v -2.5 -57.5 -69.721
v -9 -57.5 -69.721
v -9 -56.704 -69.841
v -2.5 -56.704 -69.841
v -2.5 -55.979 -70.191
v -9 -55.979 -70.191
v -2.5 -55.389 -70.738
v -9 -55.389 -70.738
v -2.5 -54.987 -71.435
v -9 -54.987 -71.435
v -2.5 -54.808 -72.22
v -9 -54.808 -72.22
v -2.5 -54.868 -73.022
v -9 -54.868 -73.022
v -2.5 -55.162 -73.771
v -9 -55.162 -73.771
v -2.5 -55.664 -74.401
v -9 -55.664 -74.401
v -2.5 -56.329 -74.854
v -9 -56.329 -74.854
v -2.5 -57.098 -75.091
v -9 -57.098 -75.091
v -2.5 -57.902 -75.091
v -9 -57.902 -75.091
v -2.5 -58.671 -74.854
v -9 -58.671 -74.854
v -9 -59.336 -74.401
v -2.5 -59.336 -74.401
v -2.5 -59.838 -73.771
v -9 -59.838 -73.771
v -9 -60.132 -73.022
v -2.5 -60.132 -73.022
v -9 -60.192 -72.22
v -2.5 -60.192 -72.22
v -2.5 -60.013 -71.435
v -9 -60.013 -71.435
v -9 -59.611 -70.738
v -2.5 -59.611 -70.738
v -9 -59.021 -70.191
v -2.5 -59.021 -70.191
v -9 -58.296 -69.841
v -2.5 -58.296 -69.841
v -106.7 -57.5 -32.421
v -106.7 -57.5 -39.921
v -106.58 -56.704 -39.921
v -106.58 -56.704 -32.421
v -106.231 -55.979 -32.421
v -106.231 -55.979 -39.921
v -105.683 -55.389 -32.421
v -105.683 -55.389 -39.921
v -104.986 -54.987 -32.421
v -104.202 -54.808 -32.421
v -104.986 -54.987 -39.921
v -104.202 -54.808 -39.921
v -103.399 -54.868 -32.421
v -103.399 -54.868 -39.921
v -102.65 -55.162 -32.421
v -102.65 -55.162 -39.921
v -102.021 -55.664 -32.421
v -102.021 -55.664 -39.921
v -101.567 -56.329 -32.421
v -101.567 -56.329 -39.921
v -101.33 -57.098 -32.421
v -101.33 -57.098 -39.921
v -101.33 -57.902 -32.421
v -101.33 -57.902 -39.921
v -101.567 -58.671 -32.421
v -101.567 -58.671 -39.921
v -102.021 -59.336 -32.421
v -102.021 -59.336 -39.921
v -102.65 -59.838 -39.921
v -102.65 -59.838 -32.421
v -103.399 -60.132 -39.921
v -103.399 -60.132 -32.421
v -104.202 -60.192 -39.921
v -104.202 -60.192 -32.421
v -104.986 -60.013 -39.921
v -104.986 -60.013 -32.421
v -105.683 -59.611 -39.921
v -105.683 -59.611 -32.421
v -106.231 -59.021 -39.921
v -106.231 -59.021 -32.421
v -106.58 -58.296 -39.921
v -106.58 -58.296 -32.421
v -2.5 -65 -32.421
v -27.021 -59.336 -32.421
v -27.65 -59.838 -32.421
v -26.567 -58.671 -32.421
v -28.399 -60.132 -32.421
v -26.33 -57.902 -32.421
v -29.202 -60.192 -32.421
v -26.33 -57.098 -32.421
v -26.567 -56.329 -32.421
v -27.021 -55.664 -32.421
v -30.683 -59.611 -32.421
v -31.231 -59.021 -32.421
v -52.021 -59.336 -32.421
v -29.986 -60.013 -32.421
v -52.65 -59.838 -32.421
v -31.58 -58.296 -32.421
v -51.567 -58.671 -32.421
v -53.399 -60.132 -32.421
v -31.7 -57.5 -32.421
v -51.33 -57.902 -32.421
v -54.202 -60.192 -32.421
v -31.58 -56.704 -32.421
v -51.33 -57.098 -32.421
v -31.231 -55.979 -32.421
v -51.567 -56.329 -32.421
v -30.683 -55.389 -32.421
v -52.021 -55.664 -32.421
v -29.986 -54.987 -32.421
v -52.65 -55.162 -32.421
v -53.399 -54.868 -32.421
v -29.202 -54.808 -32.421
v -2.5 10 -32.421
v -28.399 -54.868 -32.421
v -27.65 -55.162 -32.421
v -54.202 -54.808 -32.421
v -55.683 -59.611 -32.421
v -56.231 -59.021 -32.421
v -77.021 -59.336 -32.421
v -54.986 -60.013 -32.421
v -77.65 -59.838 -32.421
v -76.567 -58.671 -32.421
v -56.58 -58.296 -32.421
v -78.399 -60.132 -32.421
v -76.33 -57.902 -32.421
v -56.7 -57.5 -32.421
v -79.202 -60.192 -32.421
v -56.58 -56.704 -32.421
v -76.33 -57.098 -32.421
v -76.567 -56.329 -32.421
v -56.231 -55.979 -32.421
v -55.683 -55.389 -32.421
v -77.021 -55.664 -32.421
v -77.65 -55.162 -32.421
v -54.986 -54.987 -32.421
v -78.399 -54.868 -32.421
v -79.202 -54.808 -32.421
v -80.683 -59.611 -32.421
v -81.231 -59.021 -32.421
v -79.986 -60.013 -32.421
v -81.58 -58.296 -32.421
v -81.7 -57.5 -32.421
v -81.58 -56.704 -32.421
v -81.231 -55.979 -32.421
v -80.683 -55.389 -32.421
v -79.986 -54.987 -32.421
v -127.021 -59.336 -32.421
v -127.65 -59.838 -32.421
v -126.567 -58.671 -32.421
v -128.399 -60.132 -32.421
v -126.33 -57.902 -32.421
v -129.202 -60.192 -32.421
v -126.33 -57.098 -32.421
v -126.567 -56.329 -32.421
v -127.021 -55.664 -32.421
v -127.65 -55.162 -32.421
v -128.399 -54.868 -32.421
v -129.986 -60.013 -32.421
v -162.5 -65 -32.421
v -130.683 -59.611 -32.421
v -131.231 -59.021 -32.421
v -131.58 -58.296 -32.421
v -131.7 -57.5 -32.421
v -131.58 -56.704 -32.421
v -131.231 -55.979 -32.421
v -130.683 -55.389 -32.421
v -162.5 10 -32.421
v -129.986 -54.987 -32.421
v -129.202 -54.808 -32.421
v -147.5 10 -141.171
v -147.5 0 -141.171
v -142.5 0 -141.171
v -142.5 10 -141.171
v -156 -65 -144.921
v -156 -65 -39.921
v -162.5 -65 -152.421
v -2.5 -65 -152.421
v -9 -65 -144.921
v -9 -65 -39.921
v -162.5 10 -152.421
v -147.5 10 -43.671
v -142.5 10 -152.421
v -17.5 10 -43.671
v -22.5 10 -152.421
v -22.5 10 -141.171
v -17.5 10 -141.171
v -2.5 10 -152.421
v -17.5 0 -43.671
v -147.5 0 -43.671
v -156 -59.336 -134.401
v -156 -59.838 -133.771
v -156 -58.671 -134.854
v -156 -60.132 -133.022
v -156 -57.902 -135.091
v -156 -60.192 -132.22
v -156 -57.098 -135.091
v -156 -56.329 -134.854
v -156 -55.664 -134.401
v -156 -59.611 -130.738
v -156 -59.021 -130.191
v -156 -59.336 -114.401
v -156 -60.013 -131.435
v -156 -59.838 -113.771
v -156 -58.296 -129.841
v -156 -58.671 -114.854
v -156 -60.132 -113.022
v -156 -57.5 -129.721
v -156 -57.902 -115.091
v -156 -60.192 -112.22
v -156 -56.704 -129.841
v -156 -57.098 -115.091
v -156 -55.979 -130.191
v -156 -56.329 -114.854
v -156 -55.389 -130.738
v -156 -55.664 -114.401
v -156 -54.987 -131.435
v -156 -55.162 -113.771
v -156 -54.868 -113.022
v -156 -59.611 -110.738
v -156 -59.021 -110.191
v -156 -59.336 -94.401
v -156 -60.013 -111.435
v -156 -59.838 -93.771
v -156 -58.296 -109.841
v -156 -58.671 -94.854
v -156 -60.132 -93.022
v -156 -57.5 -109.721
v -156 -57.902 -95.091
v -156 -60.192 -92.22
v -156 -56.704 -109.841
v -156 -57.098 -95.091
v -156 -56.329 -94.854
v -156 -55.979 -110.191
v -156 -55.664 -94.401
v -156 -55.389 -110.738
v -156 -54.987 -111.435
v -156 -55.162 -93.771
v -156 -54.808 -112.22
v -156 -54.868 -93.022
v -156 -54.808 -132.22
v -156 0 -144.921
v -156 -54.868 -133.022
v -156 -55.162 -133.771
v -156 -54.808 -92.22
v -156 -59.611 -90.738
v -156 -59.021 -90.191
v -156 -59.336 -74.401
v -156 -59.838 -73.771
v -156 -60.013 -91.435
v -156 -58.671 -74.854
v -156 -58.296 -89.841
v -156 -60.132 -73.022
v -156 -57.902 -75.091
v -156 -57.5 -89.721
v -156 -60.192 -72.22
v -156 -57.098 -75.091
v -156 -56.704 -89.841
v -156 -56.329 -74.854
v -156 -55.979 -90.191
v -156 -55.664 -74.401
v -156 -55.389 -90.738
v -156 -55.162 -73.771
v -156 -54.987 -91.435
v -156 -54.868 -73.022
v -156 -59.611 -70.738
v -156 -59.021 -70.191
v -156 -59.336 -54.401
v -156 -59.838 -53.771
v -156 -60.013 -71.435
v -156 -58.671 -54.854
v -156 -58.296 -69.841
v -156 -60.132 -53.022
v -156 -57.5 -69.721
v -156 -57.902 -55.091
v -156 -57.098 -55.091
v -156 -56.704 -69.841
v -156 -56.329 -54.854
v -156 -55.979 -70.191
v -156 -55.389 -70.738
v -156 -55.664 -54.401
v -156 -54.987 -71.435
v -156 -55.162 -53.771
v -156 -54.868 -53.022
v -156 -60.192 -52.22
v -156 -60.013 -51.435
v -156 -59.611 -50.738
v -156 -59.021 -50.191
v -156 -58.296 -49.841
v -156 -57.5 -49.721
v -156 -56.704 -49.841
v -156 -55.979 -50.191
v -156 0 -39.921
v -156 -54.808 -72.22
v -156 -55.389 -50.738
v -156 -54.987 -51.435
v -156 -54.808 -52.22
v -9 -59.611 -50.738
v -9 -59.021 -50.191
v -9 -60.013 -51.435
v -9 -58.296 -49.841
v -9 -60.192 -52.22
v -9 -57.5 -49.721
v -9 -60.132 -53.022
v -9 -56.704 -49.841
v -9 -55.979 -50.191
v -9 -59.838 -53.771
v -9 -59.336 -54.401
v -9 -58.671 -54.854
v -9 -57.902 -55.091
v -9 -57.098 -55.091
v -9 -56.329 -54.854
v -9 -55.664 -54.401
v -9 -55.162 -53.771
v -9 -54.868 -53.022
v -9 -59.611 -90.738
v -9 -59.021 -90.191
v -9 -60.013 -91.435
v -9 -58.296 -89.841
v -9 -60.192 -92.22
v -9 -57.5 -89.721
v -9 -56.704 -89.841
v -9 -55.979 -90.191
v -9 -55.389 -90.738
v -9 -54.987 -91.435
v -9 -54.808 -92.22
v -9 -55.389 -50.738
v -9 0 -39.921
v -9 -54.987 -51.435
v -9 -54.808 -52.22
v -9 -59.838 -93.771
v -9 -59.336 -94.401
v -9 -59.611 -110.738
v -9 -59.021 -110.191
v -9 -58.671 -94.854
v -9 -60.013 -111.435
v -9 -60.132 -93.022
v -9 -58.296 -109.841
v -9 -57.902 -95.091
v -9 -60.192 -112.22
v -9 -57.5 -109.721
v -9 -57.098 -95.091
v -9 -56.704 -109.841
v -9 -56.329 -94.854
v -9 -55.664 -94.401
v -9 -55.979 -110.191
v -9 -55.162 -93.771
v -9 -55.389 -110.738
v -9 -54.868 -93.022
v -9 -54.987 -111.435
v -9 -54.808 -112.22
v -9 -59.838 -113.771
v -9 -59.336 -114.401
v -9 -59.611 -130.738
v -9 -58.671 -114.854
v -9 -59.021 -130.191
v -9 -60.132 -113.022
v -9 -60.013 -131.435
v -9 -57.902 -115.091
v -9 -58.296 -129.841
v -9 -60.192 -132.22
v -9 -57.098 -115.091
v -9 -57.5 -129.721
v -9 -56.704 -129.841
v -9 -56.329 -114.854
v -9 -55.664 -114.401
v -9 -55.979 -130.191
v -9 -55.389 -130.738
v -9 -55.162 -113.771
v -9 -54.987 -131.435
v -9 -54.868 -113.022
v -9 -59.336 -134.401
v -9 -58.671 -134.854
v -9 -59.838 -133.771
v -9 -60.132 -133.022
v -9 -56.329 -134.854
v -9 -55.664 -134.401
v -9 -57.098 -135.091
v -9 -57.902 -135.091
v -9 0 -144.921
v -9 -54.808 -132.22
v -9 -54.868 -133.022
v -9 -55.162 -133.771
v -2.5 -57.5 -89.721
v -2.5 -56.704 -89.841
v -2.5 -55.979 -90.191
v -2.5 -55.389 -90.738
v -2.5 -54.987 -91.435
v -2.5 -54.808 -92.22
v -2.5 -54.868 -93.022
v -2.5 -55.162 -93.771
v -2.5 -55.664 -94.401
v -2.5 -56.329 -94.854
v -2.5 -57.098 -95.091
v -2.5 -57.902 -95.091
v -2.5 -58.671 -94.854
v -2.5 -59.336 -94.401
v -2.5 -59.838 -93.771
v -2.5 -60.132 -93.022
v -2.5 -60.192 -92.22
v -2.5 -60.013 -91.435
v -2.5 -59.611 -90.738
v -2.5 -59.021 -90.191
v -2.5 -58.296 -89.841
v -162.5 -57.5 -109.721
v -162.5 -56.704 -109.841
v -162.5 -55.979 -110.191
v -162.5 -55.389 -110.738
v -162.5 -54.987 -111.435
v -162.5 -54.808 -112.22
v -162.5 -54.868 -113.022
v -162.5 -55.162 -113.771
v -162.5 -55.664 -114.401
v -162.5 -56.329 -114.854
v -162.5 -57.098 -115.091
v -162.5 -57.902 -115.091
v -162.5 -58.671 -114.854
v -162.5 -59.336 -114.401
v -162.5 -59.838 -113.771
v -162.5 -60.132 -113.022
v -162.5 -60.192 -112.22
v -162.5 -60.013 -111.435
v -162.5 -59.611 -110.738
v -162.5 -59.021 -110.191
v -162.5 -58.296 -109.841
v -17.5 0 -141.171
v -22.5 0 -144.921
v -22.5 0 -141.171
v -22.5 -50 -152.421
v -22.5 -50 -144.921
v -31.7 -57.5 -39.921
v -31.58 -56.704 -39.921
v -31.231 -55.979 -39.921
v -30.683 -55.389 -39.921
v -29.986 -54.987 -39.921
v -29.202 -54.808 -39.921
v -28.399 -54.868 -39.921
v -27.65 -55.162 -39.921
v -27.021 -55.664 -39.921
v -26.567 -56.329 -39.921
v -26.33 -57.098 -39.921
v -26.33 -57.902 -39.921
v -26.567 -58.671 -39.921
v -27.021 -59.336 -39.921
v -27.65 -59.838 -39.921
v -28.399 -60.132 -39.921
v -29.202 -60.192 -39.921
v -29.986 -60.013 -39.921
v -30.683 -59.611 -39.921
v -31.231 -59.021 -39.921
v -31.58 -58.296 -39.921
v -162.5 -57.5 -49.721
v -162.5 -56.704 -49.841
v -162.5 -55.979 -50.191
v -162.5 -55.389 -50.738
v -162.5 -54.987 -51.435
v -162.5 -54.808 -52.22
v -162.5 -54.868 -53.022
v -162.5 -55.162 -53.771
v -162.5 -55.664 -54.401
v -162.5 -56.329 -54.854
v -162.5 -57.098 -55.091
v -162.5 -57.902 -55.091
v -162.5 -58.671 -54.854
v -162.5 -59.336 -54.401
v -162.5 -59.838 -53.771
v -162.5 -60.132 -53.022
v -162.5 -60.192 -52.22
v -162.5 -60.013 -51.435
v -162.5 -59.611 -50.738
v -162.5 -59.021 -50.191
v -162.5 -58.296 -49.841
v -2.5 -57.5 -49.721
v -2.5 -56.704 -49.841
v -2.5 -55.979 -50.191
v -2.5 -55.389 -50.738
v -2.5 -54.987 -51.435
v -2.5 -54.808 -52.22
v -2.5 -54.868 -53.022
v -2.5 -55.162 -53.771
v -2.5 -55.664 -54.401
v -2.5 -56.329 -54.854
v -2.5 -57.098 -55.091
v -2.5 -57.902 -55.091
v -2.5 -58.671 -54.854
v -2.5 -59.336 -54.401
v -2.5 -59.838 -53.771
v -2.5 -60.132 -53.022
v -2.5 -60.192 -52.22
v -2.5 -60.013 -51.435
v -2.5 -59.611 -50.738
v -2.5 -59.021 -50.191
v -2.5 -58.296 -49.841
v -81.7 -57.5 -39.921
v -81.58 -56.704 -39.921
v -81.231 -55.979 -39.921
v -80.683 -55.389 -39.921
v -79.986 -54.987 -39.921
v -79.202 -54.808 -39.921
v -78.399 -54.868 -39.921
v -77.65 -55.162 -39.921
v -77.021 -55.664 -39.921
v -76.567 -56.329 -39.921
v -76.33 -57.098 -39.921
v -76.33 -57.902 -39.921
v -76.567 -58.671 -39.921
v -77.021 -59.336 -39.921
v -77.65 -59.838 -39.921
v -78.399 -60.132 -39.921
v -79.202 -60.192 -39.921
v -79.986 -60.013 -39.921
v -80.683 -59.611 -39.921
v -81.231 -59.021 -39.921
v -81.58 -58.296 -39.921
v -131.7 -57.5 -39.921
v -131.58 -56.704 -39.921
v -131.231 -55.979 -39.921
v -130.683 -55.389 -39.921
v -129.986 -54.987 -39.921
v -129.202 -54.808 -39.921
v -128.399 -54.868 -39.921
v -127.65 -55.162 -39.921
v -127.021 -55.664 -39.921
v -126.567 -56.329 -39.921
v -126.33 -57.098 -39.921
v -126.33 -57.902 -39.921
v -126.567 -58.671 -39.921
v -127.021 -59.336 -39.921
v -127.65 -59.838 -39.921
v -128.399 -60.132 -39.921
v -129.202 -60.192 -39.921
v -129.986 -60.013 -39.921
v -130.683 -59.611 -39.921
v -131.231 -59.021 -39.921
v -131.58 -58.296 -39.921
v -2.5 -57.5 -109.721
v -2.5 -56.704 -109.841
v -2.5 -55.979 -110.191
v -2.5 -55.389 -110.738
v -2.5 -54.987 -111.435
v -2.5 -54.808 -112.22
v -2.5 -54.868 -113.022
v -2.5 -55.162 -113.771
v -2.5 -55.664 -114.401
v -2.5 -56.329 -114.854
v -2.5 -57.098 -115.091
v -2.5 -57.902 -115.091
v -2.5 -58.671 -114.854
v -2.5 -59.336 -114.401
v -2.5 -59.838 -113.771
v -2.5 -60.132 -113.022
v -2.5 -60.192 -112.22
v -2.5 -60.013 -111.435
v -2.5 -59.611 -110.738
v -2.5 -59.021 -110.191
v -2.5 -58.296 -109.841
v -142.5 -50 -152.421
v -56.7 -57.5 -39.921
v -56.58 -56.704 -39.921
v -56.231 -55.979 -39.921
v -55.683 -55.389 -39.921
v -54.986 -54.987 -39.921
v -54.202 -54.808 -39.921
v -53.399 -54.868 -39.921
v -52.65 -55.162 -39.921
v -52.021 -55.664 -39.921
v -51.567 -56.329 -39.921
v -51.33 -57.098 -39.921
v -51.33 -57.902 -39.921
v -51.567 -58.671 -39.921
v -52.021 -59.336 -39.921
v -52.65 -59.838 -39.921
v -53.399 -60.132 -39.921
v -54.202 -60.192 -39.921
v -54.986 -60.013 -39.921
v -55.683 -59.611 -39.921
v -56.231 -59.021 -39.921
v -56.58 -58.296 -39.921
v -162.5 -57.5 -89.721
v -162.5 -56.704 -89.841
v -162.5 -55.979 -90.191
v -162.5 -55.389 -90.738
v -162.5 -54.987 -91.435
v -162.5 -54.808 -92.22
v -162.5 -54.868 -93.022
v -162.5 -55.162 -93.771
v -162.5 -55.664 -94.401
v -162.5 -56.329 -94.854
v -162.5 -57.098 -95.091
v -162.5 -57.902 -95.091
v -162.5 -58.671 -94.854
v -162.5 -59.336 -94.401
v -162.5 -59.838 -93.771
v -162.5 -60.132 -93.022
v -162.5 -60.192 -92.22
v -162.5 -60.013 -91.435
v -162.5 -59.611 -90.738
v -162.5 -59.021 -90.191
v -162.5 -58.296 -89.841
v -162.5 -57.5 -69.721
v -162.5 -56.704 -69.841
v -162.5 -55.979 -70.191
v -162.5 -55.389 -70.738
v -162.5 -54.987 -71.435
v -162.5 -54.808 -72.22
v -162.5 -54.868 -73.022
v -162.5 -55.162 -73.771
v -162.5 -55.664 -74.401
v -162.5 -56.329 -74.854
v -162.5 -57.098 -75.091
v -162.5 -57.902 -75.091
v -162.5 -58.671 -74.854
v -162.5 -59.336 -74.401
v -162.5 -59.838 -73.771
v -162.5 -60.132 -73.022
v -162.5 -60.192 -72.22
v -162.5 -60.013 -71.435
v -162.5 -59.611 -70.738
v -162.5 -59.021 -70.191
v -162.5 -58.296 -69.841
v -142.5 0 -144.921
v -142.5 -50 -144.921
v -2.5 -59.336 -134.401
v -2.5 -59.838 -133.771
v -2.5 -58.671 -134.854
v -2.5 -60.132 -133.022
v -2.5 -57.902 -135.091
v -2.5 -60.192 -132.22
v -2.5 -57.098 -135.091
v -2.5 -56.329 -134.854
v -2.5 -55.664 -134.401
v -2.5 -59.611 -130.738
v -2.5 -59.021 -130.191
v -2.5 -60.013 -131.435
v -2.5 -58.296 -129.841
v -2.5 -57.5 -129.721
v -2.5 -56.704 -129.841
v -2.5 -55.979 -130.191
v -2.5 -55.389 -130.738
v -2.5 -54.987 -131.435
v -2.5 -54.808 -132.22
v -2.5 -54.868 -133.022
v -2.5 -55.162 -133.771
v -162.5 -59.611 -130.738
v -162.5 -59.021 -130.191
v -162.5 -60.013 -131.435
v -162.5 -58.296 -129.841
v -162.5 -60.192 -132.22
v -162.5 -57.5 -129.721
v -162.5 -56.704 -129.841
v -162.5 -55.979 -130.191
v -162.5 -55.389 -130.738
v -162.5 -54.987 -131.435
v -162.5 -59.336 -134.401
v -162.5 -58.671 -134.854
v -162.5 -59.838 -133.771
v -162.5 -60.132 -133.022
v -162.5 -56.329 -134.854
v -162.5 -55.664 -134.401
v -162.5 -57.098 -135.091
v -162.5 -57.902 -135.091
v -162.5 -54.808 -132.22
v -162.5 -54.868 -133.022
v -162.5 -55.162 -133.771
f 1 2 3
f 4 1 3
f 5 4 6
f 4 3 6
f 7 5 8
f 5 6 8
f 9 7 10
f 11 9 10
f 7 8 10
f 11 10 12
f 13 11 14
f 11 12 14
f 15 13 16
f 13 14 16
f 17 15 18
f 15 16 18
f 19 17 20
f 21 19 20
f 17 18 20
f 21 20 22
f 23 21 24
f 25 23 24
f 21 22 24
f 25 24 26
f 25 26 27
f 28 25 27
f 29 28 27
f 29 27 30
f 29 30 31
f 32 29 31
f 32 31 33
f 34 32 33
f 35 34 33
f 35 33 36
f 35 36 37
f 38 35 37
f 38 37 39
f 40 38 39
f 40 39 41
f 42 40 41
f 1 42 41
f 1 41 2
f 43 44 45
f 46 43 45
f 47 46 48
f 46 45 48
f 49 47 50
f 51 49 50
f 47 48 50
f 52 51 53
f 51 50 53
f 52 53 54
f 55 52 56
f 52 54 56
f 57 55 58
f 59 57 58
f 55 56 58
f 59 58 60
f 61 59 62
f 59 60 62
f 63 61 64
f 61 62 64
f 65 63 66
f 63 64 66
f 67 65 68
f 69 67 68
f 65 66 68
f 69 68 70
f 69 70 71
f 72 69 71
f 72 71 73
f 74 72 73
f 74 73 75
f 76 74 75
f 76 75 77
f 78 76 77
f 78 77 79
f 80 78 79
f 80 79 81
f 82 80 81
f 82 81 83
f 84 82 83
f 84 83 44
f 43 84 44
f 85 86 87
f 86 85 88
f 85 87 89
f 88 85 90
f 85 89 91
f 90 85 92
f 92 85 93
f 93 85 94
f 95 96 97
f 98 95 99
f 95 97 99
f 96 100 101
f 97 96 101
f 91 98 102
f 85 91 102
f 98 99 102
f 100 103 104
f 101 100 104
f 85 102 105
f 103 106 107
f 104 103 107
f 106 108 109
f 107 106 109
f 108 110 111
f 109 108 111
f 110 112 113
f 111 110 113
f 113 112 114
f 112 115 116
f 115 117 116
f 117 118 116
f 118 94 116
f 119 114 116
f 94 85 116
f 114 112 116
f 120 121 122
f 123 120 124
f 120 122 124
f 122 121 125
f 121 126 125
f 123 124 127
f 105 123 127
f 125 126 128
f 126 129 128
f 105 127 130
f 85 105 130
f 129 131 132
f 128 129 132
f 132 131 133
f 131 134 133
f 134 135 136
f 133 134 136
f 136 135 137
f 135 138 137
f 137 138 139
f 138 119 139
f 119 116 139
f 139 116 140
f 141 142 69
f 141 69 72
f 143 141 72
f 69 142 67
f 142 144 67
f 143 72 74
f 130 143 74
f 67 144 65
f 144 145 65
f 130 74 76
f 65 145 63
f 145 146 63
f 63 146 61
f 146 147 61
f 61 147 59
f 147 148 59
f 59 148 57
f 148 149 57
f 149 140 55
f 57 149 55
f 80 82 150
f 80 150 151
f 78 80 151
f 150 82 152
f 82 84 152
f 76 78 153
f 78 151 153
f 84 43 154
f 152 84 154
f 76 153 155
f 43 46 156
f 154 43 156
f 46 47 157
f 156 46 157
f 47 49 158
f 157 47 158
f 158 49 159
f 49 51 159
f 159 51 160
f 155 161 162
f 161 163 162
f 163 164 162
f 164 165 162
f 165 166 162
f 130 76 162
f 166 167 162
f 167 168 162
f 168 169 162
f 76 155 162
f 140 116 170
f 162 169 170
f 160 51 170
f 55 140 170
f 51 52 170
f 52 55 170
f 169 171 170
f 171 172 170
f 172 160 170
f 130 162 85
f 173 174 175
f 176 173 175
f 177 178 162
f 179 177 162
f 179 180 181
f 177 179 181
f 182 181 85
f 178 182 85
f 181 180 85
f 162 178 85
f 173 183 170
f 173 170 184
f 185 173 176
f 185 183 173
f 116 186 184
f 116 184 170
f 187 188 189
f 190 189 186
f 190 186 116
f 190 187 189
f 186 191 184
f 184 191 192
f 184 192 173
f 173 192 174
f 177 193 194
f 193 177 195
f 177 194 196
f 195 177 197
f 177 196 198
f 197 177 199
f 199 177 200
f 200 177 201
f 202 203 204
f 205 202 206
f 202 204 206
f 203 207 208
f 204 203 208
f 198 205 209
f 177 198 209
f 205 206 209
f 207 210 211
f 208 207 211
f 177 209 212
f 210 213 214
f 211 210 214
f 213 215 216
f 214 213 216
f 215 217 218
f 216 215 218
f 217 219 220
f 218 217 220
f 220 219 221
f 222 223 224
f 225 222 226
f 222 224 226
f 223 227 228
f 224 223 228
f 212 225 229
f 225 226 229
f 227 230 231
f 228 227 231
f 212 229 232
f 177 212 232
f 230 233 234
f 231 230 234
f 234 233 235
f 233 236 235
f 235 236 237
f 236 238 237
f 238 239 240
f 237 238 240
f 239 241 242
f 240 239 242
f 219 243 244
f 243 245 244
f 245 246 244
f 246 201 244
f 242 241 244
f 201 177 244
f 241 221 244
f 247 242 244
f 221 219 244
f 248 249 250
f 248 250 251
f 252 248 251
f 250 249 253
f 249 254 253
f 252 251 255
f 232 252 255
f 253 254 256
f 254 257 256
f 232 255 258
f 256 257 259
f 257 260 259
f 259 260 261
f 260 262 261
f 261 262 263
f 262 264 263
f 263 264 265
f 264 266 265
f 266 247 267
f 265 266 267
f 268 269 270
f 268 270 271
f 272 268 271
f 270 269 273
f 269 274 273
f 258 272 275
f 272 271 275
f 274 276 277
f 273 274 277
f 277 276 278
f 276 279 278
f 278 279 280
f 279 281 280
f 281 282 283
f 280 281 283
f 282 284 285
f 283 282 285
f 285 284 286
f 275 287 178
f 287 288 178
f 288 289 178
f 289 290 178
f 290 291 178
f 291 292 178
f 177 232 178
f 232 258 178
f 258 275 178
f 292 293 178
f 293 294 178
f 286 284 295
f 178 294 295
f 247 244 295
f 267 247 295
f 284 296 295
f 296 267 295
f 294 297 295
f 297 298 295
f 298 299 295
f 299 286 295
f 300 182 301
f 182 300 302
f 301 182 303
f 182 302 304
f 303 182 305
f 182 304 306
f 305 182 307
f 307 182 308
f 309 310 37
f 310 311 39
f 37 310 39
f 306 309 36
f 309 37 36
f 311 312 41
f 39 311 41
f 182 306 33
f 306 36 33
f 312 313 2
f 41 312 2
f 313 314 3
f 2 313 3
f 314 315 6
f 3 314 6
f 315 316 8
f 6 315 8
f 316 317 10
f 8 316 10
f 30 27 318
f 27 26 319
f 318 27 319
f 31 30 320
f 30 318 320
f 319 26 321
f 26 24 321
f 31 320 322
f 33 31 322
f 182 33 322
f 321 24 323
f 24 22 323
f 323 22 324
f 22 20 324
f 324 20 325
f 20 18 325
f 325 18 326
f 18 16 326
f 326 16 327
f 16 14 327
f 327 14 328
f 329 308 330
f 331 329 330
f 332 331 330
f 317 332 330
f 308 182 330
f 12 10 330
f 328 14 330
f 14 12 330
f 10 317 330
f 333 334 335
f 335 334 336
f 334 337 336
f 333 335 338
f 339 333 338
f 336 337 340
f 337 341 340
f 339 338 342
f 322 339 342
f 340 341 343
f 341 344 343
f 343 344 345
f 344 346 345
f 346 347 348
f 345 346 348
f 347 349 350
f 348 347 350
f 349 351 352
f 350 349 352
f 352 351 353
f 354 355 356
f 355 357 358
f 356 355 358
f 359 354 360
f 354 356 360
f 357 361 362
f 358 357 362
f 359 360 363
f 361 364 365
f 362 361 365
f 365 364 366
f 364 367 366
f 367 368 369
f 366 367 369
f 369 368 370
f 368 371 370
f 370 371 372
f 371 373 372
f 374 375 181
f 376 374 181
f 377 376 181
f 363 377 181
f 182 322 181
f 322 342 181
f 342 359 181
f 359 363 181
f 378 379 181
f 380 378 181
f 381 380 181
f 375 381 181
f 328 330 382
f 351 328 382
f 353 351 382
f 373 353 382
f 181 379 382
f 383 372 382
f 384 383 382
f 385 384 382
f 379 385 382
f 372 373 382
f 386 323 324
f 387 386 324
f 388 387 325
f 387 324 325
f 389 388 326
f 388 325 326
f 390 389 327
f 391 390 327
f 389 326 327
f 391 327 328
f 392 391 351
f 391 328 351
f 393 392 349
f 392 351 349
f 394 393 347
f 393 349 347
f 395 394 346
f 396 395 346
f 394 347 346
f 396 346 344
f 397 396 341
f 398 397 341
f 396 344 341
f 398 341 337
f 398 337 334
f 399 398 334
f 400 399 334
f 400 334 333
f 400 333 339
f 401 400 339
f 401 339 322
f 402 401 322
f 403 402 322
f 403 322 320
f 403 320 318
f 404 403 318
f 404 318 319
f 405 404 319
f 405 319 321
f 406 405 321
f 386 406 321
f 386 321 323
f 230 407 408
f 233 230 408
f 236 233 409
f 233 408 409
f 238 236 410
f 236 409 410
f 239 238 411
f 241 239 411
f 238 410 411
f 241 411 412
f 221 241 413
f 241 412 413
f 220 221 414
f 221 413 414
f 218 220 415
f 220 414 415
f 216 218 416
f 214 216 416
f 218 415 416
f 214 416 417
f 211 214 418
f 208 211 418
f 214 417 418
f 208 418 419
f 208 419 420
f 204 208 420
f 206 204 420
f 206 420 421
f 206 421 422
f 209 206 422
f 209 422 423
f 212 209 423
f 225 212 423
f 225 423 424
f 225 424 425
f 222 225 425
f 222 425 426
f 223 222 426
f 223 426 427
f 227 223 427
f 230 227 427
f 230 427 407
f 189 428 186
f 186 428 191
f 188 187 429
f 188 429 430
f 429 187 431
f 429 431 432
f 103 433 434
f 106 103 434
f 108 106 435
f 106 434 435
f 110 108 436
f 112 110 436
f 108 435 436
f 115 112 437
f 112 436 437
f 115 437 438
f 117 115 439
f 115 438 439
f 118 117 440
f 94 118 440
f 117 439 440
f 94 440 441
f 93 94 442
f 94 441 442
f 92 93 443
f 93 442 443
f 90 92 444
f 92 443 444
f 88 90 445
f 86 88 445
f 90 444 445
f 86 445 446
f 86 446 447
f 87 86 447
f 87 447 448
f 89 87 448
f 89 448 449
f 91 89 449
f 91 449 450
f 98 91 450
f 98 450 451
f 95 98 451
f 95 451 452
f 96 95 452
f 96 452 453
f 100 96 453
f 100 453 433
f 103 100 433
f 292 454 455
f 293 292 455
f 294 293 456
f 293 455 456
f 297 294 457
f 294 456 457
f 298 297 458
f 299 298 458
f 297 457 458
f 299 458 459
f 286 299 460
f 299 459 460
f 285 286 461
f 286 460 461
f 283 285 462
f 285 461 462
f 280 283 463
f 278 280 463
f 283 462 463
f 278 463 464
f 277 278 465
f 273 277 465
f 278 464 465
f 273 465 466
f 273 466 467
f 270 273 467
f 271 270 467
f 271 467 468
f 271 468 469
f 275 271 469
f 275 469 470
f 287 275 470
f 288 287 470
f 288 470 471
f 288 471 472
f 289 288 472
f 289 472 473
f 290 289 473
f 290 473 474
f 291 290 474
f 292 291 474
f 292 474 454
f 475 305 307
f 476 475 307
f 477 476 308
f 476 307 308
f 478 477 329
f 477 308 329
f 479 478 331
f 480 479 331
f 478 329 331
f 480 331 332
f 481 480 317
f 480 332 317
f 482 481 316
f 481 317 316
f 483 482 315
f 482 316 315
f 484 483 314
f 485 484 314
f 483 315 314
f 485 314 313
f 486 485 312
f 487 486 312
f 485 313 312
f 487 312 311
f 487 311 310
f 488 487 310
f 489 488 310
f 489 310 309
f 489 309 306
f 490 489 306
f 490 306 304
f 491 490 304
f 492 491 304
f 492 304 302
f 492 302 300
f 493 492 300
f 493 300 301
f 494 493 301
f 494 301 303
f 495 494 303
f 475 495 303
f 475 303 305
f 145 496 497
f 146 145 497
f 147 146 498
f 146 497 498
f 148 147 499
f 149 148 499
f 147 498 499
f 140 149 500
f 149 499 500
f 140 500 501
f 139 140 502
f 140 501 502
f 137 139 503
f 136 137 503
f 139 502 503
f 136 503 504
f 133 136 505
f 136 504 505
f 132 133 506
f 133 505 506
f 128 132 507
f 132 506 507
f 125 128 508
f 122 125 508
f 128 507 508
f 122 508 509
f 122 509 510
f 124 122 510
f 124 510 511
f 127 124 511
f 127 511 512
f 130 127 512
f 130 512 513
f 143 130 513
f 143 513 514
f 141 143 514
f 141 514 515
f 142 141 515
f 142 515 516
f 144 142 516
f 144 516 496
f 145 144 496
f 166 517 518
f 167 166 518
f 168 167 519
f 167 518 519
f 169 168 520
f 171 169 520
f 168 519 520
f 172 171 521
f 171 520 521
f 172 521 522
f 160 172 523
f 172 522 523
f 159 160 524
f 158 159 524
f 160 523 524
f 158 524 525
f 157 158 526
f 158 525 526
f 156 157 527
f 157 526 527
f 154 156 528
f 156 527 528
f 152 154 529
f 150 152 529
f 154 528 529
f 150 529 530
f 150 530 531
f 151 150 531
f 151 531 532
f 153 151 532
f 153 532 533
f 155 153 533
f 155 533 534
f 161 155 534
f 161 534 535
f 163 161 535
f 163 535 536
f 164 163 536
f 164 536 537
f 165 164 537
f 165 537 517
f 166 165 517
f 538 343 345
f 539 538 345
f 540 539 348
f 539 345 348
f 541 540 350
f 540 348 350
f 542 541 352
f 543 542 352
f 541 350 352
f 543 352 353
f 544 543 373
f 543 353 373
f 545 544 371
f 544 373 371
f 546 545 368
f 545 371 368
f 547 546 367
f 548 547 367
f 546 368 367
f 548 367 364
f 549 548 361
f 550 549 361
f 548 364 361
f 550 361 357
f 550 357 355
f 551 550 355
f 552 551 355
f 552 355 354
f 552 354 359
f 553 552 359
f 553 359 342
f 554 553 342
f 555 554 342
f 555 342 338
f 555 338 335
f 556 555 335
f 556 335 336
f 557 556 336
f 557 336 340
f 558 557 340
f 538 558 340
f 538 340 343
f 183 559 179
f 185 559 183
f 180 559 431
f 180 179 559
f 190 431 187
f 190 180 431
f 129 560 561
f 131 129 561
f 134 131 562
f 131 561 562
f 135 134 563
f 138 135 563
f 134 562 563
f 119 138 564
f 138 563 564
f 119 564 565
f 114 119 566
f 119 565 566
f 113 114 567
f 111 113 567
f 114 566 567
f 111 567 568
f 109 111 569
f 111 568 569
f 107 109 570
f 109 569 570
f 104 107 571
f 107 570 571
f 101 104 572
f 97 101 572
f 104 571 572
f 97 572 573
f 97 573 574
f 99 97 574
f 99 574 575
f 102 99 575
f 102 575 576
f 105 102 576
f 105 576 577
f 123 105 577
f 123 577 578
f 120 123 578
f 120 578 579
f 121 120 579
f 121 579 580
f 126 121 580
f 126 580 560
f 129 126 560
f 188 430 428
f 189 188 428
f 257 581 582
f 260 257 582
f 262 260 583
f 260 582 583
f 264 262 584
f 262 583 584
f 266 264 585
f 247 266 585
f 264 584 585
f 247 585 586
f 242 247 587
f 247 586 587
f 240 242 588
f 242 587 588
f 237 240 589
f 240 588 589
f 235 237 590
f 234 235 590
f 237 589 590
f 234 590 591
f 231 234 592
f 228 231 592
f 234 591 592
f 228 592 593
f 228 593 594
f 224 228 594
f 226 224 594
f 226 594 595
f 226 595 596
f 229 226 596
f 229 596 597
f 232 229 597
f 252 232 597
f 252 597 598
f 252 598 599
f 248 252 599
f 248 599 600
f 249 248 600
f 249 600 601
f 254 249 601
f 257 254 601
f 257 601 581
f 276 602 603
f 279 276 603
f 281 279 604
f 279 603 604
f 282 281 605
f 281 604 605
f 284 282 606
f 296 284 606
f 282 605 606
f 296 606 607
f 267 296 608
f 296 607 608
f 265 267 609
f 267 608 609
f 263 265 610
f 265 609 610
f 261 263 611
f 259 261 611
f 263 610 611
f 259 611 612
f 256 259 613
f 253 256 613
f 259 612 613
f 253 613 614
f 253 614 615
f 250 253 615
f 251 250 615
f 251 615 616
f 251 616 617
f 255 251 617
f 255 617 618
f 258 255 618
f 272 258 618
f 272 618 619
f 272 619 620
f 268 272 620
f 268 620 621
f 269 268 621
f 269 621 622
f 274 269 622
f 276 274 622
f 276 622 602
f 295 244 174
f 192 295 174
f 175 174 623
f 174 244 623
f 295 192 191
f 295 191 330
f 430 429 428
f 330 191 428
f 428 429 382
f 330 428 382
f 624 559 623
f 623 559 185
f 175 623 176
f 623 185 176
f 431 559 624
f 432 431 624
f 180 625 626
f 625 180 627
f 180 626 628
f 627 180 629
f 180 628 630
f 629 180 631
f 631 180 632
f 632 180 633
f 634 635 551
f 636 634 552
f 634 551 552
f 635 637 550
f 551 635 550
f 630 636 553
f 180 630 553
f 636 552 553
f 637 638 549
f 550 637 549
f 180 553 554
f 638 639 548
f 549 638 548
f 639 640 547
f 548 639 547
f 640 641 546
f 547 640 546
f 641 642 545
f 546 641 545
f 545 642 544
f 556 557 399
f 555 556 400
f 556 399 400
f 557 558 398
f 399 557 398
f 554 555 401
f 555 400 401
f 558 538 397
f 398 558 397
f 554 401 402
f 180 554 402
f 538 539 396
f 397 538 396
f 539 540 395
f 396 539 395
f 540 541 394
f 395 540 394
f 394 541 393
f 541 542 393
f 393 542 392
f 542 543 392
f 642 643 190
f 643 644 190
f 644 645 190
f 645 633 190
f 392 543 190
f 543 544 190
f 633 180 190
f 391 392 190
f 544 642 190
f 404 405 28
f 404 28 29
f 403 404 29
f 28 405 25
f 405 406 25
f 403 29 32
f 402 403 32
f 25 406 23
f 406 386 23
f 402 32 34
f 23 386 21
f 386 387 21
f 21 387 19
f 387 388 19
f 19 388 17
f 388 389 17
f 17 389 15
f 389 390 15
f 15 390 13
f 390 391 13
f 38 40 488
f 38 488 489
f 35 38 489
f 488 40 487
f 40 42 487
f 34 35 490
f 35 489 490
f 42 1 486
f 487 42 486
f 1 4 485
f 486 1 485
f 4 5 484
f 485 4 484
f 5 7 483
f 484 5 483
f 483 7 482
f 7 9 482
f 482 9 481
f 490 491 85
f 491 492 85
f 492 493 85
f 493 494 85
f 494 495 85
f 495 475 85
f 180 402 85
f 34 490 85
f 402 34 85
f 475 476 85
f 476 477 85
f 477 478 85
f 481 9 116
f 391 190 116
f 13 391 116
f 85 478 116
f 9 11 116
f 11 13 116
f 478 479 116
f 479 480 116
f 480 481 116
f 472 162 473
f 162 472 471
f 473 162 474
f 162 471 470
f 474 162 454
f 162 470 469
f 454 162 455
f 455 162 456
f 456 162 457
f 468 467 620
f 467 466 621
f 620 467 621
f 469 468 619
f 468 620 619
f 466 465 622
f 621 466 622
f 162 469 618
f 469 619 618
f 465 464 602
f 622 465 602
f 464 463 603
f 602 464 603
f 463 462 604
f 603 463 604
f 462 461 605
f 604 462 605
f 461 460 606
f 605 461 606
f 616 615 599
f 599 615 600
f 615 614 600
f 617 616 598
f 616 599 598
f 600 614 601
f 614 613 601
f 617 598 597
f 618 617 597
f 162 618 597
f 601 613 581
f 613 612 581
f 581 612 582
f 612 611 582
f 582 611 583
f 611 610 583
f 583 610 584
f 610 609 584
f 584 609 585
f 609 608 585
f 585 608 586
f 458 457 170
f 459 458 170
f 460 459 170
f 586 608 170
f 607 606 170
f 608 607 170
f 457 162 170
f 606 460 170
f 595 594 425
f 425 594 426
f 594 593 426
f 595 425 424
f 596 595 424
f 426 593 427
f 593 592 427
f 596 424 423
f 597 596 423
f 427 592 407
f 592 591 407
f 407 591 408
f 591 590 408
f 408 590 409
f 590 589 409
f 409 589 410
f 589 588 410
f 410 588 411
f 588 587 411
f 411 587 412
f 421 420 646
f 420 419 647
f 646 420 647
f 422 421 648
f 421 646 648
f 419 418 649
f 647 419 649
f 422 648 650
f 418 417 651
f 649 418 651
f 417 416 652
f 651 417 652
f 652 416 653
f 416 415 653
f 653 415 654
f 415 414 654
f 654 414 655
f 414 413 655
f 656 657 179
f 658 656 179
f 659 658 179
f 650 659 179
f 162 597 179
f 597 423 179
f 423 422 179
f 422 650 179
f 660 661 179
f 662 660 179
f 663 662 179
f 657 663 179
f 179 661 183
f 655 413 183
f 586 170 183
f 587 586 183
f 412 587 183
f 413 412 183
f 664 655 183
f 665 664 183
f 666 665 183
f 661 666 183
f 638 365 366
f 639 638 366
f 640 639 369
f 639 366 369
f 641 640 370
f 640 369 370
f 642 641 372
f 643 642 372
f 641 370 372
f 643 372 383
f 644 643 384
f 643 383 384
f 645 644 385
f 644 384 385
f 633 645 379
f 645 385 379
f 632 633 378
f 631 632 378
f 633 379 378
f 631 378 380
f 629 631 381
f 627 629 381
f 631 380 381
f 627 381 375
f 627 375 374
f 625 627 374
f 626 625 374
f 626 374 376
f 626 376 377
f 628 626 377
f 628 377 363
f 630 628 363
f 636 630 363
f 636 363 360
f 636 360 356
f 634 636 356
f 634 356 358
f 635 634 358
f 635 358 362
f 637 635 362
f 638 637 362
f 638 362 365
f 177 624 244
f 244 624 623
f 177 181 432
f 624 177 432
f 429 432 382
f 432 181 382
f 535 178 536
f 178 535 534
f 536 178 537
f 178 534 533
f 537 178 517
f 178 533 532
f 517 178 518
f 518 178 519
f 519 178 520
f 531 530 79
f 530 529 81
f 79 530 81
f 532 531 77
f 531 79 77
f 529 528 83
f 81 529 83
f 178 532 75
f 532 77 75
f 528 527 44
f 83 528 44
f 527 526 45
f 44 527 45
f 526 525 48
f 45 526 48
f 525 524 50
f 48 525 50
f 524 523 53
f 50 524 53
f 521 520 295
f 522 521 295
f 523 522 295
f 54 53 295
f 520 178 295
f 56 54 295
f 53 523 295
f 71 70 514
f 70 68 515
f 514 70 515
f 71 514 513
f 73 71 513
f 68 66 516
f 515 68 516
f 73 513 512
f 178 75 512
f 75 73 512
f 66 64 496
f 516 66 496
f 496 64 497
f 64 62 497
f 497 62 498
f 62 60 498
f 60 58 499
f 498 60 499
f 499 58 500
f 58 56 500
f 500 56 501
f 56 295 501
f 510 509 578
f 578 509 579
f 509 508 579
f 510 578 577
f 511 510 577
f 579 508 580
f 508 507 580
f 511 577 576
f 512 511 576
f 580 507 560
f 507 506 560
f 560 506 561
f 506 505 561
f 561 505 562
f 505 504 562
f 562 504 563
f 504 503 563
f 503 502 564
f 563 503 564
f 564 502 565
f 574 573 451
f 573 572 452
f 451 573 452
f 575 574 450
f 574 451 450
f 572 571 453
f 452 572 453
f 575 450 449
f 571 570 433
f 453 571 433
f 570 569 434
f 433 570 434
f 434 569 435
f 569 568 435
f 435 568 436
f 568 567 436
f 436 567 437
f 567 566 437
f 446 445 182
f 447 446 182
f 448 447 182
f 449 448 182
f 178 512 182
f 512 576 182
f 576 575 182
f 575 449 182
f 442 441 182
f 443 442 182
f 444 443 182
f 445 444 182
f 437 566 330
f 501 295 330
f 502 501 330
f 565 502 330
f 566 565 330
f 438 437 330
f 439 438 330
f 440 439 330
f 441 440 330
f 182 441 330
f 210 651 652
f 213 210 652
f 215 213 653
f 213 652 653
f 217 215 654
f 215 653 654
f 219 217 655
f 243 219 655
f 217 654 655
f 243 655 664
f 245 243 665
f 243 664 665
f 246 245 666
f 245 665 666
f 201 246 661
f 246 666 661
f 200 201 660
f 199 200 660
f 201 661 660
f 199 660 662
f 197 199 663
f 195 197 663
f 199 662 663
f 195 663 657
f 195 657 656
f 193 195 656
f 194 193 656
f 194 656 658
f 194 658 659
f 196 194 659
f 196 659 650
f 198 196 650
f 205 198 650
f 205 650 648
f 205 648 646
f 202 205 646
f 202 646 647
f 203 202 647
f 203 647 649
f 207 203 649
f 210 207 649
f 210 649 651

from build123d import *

# Parameters (mm, degrees)
BOSS_EXTRUDE1_DEPTH = 10
BOSS_EXTRUDE2_DEPTH = 65
SKETCH5_R           = 2.7
M5HOLES_DEPTH       = 231.341689519
SKETCH6_R           = 2.7
M5_HOLES_DEPTH      = 25
SKETCH7_W           = 7.5
SKETCH7_H           = 15
BOSS_EXTRUDE3_DEPTH = 121


with BuildPart() as part:
    # Sketch1 → Boss-Extrude1 (new body)
    with BuildSketch(Plane(origin=(0, 0, 0), x_dir=(1, 0, 0), z_dir=(0, 1, 0))):
        Polygon((-142.5, 141.171435272), (-142.5, 152.421435272), (-162.5, 152.421435272), (-162.5, 32.421435272), (-2.5, 32.421435272), (-2.5, 152.421435272), (-22.5, 152.421435272), (-22.5, 141.171435272), (-17.5, 141.171435272), (-17.5, 43.671435272), (-147.5, 43.671435272), (-147.5, 141.171435272), align=None)
    extrude(amount=BOSS_EXTRUDE1_DEPTH)

    # Sketch2 → Boss-Extrude2 (add)
    with BuildSketch(Plane.XZ):
        Polygon((-156, -144.921435272), (-156, -39.921435272), (-9, -39.921435272), (-9, -144.921435272), (-22.5, -144.921435272), (-22.5, -152.421435272), (-2.5, -152.421435272), (-2.5, -32.421435272), (-162.5, -32.421435272), (-162.5, -152.421435272), (-142.5, -152.421435272), (-142.5, -144.921435272), align=None)
    extrude(amount=BOSS_EXTRUDE2_DEPTH)

    # Sketch5 → M5holes (cut, through all)
    with BuildSketch(Plane.ZY.offset(162.5)):
        with Locations((-132.421435272, -57.5)):
            Circle(SKETCH5_R)
        with Locations((-112.421435272, -57.5)):
            Circle(SKETCH5_R)
        with Locations((-92.421435272, -57.5)):
            Circle(SKETCH5_R)
        with Locations((-72.421435272, -57.5)):
            Circle(SKETCH5_R)
        with Locations((-52.421435272, -57.5)):
            Circle(SKETCH5_R)
    extrude(amount=-M5HOLES_DEPTH, mode=Mode.SUBTRACT)

    # Sketch6 → M5_holes (cut)
    with BuildSketch(Plane(origin=(0, 0, -39.921435272), x_dir=(-1, 0, 0), z_dir=(0, 0, -1))):
        with Locations((29, -57.5)):
            Circle(SKETCH6_R)
        with Locations((54, -57.5)):
            Circle(SKETCH6_R)
        with Locations((79, -57.5)):
            Circle(SKETCH6_R)
        with Locations((104, -57.5)):
            Circle(SKETCH6_R)
        with Locations((129, -57.5)):
            Circle(SKETCH6_R)
    extrude(amount=-M5_HOLES_DEPTH, mode=Mode.SUBTRACT)

    # Sketch7 → Boss-Extrude3 (add)
    with BuildSketch(Plane.ZY.offset(22.5)):
        with Locations((-148.671435272, -57.5)):
            Rectangle(SKETCH7_W, SKETCH7_H)
    extrude(amount=BOSS_EXTRUDE3_DEPTH)


solid = part.part
